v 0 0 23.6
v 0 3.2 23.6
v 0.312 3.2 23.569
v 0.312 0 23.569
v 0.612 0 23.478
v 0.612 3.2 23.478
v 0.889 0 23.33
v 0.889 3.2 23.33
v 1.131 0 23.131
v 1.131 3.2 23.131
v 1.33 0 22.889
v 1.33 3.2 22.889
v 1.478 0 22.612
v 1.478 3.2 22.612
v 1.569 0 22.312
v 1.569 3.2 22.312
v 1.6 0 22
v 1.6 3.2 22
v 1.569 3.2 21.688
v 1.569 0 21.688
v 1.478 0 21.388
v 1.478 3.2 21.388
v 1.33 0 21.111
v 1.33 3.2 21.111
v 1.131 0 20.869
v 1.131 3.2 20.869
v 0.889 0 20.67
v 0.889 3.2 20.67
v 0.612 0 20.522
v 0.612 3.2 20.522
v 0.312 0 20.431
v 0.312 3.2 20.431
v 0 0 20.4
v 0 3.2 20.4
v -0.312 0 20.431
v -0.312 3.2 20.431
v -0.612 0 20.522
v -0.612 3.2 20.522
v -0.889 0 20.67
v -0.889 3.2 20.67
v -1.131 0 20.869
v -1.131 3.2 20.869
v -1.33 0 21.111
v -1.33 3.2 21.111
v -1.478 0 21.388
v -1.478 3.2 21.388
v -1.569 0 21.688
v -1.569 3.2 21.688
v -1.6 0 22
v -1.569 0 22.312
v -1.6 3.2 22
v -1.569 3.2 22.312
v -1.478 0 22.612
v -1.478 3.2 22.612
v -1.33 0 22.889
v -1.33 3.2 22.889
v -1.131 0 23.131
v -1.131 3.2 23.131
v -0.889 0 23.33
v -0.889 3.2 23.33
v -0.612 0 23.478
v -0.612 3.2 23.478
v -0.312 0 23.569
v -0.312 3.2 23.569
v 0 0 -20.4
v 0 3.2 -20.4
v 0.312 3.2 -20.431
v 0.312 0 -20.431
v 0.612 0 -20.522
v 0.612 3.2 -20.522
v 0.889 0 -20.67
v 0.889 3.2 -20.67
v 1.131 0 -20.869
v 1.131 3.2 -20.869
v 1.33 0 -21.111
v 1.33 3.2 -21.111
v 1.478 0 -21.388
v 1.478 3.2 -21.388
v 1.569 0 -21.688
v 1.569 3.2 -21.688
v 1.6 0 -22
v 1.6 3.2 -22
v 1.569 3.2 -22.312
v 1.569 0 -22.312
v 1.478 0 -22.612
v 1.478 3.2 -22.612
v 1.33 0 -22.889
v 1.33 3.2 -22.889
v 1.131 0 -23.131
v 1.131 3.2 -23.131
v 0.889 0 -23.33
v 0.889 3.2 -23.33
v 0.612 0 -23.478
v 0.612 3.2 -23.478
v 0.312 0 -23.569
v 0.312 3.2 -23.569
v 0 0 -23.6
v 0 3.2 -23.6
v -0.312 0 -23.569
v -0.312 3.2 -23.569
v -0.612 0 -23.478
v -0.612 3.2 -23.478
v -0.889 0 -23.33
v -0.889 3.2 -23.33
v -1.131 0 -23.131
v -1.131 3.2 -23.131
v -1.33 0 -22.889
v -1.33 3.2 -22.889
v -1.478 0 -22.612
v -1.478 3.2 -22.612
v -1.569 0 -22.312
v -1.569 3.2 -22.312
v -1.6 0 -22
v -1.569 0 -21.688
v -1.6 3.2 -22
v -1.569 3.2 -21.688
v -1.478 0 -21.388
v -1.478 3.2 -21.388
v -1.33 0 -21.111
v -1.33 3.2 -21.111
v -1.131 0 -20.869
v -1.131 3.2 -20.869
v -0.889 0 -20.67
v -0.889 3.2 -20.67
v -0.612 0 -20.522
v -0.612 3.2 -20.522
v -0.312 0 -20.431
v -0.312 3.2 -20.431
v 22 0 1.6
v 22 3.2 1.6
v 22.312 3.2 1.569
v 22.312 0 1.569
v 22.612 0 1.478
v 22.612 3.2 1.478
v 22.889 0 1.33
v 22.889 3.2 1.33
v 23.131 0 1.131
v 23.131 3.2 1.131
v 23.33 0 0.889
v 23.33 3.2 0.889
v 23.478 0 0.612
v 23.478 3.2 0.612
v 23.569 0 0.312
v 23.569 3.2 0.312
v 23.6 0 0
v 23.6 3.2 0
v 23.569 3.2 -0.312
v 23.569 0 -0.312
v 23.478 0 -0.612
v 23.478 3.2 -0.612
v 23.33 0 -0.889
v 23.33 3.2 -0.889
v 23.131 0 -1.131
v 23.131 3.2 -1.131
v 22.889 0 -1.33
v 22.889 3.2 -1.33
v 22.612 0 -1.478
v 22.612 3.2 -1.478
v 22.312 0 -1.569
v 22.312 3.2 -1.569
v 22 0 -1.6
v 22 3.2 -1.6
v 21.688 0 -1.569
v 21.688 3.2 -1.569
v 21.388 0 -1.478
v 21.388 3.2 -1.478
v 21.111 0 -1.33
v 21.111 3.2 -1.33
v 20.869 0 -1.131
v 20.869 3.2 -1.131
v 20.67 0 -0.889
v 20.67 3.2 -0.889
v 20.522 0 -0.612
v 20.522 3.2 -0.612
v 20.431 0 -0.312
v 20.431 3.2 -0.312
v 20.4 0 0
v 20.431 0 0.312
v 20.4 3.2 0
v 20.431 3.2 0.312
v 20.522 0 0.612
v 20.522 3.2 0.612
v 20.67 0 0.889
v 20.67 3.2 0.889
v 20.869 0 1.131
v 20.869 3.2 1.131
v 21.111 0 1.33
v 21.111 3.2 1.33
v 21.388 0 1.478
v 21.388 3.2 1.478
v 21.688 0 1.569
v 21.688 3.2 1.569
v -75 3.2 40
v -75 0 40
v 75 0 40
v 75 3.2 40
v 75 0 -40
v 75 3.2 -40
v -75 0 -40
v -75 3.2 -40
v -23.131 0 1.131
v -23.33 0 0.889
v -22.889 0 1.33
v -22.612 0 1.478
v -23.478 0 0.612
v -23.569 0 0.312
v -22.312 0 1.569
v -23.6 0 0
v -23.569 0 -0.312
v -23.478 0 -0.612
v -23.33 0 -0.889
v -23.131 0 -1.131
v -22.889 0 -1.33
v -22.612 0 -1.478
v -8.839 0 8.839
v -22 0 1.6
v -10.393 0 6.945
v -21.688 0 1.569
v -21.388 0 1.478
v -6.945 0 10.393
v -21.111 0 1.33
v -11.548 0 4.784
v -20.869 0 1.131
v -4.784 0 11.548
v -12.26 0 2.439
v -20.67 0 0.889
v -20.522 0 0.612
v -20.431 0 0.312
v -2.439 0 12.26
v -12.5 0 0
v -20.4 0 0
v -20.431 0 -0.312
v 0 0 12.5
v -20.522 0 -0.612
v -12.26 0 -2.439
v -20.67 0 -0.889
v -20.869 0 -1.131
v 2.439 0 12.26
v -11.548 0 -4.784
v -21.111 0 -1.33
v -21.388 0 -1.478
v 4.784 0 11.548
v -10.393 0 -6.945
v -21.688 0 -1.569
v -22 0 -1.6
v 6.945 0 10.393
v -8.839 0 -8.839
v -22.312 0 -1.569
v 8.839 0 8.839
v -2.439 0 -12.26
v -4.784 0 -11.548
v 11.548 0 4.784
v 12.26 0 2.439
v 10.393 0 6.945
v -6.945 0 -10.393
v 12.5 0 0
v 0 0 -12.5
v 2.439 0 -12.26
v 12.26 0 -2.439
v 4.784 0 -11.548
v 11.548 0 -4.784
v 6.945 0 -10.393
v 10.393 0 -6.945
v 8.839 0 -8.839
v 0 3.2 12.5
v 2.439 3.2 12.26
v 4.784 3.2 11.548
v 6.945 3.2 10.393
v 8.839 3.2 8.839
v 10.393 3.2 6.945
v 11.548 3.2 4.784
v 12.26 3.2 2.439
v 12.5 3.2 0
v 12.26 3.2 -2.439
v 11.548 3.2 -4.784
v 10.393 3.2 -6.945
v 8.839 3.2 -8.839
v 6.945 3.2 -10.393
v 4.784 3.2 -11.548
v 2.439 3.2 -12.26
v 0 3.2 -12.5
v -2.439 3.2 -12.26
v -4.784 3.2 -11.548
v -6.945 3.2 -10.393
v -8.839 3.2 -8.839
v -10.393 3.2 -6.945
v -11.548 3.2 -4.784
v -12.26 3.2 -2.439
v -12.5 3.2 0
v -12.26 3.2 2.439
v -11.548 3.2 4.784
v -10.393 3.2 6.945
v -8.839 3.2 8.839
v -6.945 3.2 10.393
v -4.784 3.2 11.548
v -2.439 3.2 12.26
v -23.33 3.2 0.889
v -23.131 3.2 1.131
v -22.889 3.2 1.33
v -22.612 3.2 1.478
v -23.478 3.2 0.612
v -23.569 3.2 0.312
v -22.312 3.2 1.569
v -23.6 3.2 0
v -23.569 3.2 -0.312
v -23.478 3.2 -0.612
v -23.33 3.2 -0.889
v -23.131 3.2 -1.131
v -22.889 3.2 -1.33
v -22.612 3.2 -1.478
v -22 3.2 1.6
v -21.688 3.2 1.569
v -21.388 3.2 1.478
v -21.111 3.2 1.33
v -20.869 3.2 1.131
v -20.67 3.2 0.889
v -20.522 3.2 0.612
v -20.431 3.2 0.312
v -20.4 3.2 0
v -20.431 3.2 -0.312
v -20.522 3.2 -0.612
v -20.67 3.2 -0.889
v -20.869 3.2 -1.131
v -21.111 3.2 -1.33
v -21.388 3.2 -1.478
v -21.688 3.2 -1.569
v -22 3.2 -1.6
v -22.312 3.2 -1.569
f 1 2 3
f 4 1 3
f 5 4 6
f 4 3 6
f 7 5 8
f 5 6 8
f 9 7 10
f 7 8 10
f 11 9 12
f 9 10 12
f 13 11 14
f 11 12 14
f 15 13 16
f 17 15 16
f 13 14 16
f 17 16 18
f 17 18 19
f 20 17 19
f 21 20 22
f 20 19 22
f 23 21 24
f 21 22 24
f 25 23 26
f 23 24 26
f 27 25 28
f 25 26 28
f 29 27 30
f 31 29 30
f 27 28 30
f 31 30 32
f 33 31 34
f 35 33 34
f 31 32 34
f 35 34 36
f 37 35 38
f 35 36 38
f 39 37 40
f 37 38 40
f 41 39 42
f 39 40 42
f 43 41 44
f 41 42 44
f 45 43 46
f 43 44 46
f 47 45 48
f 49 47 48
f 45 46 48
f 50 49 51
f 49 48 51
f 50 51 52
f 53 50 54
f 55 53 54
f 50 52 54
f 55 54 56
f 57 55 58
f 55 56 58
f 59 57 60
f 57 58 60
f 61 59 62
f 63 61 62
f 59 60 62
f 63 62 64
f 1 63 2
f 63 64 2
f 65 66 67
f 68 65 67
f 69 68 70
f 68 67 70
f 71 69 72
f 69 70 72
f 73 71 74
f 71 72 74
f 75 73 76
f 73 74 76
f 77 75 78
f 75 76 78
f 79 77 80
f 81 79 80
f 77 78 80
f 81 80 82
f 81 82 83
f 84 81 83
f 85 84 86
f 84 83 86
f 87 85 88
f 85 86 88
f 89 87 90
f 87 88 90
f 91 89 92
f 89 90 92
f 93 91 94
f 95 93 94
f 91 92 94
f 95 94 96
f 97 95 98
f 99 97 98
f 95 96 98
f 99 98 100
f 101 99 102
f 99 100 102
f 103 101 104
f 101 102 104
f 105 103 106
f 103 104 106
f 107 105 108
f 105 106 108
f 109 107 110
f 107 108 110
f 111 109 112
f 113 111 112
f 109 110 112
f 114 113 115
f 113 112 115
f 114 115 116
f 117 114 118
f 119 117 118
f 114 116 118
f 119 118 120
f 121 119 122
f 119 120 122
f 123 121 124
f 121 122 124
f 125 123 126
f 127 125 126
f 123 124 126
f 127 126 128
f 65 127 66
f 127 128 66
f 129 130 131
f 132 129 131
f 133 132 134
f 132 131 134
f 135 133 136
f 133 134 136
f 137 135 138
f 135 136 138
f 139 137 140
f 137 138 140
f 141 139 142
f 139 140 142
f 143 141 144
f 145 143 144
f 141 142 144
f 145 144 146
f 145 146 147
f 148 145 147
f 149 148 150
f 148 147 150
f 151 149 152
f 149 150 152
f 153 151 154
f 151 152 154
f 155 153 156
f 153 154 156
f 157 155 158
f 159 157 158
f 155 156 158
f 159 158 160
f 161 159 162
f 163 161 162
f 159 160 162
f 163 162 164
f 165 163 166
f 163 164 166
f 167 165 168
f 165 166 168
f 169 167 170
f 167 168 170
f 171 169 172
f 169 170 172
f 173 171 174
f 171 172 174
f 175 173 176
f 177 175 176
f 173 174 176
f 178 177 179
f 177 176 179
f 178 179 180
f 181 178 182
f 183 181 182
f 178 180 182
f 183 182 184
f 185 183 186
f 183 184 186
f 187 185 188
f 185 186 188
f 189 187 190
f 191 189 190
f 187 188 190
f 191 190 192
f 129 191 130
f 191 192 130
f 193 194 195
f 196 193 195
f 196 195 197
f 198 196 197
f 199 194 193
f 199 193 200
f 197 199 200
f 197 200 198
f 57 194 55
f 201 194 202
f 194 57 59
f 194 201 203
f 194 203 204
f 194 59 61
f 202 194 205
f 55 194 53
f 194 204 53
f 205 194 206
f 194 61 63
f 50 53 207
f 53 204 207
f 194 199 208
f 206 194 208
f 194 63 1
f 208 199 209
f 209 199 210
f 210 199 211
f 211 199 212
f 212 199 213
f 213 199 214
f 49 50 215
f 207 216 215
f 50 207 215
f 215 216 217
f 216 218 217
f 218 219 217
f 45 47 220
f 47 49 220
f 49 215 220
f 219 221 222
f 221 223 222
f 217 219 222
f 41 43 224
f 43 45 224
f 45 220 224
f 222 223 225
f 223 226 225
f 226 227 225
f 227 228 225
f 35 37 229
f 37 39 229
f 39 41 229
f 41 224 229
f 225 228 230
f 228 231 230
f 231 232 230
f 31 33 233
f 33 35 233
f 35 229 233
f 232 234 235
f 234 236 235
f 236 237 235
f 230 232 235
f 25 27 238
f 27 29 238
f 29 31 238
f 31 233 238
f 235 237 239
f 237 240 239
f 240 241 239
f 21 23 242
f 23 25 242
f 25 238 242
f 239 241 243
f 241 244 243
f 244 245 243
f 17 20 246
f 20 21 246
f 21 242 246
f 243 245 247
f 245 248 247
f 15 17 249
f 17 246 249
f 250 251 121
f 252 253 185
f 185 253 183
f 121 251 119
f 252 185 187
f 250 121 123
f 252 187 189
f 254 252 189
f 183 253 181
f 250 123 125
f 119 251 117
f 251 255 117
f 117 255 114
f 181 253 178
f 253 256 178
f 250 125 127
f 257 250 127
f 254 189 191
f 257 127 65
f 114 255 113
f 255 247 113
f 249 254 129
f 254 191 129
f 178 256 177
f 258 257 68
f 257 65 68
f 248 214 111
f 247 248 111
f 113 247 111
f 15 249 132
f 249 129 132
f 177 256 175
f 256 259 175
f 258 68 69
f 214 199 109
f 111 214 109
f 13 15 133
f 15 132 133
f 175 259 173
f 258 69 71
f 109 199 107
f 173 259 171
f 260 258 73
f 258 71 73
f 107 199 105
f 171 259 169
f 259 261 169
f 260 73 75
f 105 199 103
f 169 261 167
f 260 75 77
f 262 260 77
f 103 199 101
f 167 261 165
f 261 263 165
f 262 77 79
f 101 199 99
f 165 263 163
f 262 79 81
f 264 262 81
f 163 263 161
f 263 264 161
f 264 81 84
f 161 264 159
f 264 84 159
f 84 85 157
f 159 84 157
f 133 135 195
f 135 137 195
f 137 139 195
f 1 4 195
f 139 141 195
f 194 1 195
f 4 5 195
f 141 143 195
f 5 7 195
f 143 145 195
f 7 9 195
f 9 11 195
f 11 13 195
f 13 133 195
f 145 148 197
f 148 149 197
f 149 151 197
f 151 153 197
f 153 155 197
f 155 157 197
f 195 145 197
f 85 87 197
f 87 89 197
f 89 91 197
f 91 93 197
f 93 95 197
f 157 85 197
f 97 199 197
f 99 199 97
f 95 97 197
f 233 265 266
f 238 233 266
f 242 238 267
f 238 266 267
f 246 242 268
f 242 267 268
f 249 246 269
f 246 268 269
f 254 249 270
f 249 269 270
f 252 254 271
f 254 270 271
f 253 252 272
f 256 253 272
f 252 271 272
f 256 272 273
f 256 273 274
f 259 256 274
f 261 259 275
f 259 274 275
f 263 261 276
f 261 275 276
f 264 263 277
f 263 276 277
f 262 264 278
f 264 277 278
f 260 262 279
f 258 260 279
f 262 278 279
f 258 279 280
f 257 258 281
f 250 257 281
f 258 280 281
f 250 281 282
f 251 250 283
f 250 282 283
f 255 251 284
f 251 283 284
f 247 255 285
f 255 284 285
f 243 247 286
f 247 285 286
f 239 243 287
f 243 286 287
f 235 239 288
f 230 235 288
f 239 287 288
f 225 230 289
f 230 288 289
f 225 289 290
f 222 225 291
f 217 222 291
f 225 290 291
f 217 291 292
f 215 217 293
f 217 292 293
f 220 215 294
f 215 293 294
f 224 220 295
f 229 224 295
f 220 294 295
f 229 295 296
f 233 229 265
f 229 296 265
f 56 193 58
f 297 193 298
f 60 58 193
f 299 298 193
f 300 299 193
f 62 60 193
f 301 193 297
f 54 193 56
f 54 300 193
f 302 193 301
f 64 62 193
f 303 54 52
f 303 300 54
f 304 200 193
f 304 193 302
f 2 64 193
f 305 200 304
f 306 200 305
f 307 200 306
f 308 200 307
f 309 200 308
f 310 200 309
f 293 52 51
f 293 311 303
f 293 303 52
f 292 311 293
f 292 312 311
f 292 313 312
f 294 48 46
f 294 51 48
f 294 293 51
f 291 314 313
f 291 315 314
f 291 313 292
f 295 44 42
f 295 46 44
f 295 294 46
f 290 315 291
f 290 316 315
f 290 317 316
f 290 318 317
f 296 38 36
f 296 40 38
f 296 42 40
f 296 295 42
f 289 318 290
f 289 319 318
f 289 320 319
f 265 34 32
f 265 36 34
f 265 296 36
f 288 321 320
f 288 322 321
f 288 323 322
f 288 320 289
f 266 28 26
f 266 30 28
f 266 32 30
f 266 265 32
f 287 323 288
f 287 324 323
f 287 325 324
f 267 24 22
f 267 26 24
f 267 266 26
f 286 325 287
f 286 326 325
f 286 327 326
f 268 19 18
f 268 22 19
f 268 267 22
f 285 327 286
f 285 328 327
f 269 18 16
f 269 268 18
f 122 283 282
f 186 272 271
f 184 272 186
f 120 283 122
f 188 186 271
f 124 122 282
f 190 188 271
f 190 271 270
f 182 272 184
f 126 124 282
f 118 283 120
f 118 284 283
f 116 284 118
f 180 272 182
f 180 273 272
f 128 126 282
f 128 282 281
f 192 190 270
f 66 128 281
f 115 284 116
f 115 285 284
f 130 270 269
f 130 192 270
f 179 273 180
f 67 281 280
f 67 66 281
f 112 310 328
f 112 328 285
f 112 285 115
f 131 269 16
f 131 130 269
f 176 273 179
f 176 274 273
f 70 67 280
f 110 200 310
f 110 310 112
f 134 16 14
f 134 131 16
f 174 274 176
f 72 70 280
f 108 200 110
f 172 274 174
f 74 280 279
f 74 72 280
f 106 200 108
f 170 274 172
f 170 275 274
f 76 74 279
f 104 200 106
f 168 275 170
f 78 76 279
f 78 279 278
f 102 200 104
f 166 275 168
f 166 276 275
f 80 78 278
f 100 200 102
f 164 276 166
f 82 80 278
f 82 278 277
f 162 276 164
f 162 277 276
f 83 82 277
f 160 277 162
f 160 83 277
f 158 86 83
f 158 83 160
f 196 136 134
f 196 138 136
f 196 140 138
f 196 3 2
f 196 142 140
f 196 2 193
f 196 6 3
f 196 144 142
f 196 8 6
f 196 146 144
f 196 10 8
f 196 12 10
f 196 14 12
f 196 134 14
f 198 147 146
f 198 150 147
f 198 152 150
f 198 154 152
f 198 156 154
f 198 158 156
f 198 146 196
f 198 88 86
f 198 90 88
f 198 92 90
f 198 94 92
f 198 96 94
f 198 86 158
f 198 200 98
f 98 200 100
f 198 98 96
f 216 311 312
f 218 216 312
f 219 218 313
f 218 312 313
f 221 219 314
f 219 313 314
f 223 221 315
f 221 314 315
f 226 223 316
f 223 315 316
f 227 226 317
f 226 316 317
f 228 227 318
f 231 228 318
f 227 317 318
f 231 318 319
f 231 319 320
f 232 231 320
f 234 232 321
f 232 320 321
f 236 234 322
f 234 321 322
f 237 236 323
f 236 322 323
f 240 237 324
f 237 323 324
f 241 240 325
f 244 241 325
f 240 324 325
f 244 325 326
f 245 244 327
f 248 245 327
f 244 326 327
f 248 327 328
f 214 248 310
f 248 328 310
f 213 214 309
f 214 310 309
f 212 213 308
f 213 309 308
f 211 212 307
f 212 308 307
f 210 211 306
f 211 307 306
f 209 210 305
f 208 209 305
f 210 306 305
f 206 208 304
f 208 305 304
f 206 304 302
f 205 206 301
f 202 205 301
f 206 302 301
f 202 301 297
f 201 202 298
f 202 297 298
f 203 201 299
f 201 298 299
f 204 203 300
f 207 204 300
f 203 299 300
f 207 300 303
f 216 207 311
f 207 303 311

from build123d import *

# Parameters (mm, degrees)
SKETCH_1_W          = 150
SKETCH_1_H          = 80
EXTRUDE_1_DEPTH     = 3.2
SKETCH_2_R          = 12.5
CUT_EXTRUDE_1_DEPTH = 3.2
SKETCH_3_R          = 1.6
CUT_EXTRUDE_3_DEPTH = 3.2


with BuildPart() as part:
    # 草图1 → 凸台-拉伸1 (new body)
    with BuildSketch(Plane(origin=(0, 0, 0), x_dir=(1, 0, 0), z_dir=(0, 1, 0))):
        Rectangle(SKETCH_1_W, SKETCH_1_H)
    extrude(amount=EXTRUDE_1_DEPTH)

    # 草图2 → 切除-拉伸1 (cut)
    with BuildSketch(Plane(origin=(0, 3.2, 0), x_dir=(1, 0, 0), z_dir=(0, 1, 0))):
        with Locations(Location((0, 0, 0), (0, 0, 270))):
            Circle(SKETCH_2_R)
    extrude(amount=-CUT_EXTRUDE_1_DEPTH, mode=Mode.SUBTRACT)

    # 草图3 → 切除-拉伸3 (cut)
    with BuildSketch(Plane(origin=(0, 3.2, 0), x_dir=(1, 0, 0), z_dir=(0, 1, 0))):
        with Locations(Location((0, -22, 0), (0, 0, 270))):
            Circle(SKETCH_3_R)
        with Locations(Location((-22, 0, 0), (0, 0, 270))):
            Circle(SKETCH_3_R)
        with Locations(Location((0, 22, 0), (0, 0, 270))):
            Circle(SKETCH_3_R)
        with Locations(Location((22, 0, 0), (0, 0, 270))):
            Circle(SKETCH_3_R)
    extrude(amount=-CUT_EXTRUDE_3_DEPTH, mode=Mode.SUBTRACT)


solid = part.part
